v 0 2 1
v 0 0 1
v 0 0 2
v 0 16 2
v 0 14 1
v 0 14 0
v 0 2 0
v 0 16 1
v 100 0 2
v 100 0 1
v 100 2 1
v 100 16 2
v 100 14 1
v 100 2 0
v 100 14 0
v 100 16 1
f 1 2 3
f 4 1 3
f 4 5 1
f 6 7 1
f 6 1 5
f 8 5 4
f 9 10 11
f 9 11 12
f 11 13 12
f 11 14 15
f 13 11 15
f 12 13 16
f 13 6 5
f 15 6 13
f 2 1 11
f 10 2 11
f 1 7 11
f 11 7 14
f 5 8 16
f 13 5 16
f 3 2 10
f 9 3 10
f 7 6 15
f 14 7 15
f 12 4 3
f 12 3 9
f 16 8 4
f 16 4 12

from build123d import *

# Parameters (mm, degrees)
BOX_W        = 100
BOX_H        = 16
BOX_DEPTH    = 1
BOX001_W     = 100
BOX001_H     = 12
BOX001_DEPTH = 1


with BuildPart() as f_16mm:
    # Box → Box (new body)
    with BuildSketch(Plane.XY.offset(1)):
        with Locations((50, 8)):
            Rectangle(BOX_W, BOX_H)
    extrude(amount=BOX_DEPTH)


with BuildPart() as k8200_profile:
    # Box001 → Box001 (new body)
    with BuildSketch(Plane(origin=(0, 2, 0), x_dir=(1, 0, 0), z_dir=(0, 0, 1))):
        with Locations((50, 6)):
            Rectangle(BOX001_W, BOX001_H)
    extrude(amount=BOX001_DEPTH)

    # Fusion: union 16mm
    add(f_16mm.part)


solid = k8200_profile.part
